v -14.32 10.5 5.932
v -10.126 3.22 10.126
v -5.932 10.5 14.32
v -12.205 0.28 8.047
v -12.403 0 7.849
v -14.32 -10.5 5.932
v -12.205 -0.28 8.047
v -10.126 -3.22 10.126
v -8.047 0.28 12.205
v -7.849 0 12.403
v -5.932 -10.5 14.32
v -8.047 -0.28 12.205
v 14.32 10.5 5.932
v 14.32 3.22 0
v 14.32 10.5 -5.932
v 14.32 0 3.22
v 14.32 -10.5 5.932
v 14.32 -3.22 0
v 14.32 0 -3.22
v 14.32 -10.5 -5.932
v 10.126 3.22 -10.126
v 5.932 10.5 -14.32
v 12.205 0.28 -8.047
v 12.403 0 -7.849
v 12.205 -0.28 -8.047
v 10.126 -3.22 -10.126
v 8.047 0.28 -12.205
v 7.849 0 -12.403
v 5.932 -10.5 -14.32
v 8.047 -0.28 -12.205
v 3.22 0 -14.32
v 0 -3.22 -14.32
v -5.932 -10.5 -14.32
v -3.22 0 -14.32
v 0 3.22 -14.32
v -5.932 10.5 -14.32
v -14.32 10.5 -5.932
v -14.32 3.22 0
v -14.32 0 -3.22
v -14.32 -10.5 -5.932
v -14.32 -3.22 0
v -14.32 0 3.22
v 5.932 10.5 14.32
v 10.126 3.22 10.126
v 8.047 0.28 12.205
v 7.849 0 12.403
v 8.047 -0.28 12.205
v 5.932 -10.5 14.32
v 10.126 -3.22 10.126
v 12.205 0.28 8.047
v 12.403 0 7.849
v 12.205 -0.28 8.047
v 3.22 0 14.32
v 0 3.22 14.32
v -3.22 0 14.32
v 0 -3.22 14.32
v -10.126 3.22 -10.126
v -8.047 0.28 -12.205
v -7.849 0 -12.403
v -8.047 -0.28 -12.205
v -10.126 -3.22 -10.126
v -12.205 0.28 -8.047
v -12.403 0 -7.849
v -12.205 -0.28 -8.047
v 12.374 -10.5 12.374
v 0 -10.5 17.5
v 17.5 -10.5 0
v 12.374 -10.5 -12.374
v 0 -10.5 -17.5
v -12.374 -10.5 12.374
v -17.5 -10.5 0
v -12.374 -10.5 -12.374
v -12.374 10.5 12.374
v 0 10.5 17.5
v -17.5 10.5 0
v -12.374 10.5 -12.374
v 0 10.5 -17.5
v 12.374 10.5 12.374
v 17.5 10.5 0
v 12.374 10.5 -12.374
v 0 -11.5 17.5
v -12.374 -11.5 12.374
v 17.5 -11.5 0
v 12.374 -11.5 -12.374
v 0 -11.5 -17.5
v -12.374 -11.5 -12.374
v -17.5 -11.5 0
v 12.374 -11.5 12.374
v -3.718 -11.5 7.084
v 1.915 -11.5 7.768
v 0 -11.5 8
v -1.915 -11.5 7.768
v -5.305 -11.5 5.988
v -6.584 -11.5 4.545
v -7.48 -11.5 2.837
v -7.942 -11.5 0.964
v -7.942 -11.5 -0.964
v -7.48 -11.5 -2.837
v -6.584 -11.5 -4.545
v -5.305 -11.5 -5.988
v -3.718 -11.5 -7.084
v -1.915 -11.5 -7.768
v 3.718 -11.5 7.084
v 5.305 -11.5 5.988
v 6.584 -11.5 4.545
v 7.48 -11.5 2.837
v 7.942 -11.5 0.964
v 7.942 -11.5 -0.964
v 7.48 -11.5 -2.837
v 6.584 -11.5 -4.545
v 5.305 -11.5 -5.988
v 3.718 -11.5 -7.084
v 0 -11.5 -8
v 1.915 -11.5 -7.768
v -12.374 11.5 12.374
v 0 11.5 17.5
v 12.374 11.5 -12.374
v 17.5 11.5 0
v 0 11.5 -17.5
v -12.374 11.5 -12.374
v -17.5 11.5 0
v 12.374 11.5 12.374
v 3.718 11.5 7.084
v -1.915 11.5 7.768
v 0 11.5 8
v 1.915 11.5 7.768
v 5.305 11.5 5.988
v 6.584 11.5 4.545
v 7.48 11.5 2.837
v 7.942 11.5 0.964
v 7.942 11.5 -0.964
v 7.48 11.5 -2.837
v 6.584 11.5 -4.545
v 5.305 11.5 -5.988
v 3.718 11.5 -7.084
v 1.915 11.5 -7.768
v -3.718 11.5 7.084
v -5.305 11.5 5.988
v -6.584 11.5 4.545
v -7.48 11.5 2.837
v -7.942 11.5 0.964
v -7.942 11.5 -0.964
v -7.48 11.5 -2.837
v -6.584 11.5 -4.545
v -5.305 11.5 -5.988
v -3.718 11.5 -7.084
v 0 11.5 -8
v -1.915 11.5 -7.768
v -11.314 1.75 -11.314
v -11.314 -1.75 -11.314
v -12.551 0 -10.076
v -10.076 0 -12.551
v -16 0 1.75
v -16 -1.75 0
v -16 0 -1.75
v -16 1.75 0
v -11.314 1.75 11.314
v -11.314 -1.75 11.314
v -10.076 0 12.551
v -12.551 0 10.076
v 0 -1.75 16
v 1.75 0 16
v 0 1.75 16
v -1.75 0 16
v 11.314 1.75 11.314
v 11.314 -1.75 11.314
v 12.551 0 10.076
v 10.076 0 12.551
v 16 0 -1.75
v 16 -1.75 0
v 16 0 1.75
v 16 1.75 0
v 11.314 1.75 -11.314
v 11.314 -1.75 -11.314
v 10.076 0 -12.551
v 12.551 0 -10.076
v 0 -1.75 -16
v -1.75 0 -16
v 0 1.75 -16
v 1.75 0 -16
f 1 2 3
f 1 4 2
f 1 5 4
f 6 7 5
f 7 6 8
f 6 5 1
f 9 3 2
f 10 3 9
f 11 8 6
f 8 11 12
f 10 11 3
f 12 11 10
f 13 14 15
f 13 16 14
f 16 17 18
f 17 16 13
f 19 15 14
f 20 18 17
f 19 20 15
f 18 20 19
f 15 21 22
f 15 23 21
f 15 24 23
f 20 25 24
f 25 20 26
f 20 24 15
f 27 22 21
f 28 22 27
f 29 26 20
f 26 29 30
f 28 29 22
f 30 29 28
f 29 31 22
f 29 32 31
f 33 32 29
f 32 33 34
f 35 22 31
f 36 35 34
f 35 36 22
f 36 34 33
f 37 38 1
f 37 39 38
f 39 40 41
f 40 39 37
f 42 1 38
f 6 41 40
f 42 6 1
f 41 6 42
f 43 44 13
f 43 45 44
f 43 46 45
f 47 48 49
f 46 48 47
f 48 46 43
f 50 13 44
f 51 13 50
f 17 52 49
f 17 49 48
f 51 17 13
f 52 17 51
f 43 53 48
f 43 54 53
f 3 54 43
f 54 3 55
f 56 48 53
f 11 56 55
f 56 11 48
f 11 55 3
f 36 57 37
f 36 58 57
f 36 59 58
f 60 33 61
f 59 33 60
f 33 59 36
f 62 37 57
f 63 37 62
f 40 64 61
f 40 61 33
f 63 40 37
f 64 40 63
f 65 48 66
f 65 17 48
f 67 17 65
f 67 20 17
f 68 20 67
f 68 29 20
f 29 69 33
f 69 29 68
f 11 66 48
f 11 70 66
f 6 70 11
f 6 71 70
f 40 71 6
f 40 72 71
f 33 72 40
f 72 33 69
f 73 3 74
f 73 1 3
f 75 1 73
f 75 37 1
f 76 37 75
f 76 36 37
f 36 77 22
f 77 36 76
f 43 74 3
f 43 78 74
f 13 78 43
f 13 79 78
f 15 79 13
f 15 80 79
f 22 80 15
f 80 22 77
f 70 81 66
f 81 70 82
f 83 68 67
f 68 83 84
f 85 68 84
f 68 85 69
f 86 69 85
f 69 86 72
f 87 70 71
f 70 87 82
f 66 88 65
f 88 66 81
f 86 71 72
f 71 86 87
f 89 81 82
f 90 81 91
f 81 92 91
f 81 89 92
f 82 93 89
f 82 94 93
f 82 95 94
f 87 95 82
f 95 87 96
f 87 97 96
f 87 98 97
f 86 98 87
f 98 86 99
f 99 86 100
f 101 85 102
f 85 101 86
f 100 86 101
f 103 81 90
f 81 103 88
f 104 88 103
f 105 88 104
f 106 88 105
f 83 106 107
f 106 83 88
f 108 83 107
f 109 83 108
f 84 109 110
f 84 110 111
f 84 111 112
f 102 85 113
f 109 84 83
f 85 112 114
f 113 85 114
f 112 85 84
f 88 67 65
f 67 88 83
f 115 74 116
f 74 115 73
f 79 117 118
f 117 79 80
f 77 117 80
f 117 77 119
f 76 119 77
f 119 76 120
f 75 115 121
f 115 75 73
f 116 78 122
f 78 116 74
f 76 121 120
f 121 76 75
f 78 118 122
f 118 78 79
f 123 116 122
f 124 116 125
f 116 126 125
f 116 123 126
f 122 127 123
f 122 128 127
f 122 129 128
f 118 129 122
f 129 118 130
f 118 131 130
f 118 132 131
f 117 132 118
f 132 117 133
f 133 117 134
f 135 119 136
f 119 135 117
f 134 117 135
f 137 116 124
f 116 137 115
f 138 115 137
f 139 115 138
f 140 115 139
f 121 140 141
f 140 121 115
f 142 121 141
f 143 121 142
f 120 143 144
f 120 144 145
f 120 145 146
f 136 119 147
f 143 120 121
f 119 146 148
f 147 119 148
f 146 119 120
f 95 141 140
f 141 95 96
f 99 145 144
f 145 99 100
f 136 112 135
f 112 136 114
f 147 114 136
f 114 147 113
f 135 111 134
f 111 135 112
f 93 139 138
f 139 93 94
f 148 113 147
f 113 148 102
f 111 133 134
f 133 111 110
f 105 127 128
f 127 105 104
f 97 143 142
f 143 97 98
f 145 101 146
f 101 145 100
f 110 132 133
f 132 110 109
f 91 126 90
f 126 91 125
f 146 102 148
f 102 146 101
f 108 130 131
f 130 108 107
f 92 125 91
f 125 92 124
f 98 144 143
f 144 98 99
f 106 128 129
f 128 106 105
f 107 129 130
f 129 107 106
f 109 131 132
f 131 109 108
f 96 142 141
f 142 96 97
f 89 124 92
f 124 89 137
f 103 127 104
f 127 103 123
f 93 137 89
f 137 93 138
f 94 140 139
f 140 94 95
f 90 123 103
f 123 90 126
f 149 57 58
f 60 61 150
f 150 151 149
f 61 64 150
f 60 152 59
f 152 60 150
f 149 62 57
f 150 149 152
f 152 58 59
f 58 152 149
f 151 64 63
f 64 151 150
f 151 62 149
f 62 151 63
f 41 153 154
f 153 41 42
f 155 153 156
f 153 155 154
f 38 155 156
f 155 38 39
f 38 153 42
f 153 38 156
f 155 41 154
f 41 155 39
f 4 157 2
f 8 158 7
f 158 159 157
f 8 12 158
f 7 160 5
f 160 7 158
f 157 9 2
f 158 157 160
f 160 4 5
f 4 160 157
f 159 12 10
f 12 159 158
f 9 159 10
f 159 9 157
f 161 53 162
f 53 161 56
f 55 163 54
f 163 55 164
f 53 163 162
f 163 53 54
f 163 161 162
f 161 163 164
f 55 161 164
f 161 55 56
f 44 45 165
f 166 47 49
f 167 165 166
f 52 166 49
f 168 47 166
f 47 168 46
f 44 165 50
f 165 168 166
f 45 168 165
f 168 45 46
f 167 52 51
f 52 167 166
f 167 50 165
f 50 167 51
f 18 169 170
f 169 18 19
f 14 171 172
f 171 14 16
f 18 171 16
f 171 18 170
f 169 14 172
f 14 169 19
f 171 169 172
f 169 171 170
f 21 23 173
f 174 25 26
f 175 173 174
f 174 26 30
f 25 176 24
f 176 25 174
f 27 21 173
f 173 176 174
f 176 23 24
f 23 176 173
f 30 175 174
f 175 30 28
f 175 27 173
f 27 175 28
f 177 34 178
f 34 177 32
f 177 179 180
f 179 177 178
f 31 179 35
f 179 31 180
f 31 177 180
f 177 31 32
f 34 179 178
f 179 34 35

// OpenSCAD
//use <use/openscad/shapes.scad>

//wheel_slave_original();


wheel(axle_d = 16, wheel_w=21, wheel_d = 31, pyramid_h = 2, rim_w=1, rim_d = 35, rim_fn = 8);
module wheel(axle_d = 16, wheel_w=21, wheel_d = 31, pyramid_h = 2, rim_w=1, rim_d = 31, rim_fn = 20){
    
    //main wheel
    rotate([180,90,90])
    union(){
        difference(){
            union(){
                rotate([0,0,022.5])
                cylinder(d=wheel_d, h=wheel_w, center=true, $fn = 8);
                //rims
                translate([0,0,wheel_w/2 + rim_w/2])
                cylinder(d=rim_d, h = rim_w, center=true, $fn=rim_fn);
                translate([0,0,-wheel_w/2 +- rim_w/2])
                cylinder(d=rim_d, h = rim_w, center=true, $fn= rim_fn);              
            }
            cylinder(d=axle_d,h=wheel_w + rim_w*2,center=true);
            //bearing_608_difference(wheel_w=wheel_w, rim_w=rim_w);
        }
      
        //tread
        pyramids(pyramid_h=pyramid_h, wheel_w = wheel_w);
    }
}

module bearing_retainer(){

}
module bearing_608_difference(wheel_w=21, rim_w=1){
    color("red")
    translate([0,0,wheel_w/2+rim_w - 17/4])
        cylinder(d=22, h=17, center=true);//7mm + 1 for extra depth into wheel, must correspond to axle configuration
}

module pyramids(pyramid_h=2){
    for (i = [1 : 8]){
        color("red")
        rotate([45*i,90,0])
        translate([0,0,wheel_w/2 + pyramid_h*1.75])    
        cylinder(d=7,d2=3.5,h=pyramid_h,$fn=4);
    }   
}
module wheel_slave_original(){
    translate([35,-10,2])
    rotate([0,0,0])
    color("green")
    import("import/slave_wheel_SL.stl");
}
